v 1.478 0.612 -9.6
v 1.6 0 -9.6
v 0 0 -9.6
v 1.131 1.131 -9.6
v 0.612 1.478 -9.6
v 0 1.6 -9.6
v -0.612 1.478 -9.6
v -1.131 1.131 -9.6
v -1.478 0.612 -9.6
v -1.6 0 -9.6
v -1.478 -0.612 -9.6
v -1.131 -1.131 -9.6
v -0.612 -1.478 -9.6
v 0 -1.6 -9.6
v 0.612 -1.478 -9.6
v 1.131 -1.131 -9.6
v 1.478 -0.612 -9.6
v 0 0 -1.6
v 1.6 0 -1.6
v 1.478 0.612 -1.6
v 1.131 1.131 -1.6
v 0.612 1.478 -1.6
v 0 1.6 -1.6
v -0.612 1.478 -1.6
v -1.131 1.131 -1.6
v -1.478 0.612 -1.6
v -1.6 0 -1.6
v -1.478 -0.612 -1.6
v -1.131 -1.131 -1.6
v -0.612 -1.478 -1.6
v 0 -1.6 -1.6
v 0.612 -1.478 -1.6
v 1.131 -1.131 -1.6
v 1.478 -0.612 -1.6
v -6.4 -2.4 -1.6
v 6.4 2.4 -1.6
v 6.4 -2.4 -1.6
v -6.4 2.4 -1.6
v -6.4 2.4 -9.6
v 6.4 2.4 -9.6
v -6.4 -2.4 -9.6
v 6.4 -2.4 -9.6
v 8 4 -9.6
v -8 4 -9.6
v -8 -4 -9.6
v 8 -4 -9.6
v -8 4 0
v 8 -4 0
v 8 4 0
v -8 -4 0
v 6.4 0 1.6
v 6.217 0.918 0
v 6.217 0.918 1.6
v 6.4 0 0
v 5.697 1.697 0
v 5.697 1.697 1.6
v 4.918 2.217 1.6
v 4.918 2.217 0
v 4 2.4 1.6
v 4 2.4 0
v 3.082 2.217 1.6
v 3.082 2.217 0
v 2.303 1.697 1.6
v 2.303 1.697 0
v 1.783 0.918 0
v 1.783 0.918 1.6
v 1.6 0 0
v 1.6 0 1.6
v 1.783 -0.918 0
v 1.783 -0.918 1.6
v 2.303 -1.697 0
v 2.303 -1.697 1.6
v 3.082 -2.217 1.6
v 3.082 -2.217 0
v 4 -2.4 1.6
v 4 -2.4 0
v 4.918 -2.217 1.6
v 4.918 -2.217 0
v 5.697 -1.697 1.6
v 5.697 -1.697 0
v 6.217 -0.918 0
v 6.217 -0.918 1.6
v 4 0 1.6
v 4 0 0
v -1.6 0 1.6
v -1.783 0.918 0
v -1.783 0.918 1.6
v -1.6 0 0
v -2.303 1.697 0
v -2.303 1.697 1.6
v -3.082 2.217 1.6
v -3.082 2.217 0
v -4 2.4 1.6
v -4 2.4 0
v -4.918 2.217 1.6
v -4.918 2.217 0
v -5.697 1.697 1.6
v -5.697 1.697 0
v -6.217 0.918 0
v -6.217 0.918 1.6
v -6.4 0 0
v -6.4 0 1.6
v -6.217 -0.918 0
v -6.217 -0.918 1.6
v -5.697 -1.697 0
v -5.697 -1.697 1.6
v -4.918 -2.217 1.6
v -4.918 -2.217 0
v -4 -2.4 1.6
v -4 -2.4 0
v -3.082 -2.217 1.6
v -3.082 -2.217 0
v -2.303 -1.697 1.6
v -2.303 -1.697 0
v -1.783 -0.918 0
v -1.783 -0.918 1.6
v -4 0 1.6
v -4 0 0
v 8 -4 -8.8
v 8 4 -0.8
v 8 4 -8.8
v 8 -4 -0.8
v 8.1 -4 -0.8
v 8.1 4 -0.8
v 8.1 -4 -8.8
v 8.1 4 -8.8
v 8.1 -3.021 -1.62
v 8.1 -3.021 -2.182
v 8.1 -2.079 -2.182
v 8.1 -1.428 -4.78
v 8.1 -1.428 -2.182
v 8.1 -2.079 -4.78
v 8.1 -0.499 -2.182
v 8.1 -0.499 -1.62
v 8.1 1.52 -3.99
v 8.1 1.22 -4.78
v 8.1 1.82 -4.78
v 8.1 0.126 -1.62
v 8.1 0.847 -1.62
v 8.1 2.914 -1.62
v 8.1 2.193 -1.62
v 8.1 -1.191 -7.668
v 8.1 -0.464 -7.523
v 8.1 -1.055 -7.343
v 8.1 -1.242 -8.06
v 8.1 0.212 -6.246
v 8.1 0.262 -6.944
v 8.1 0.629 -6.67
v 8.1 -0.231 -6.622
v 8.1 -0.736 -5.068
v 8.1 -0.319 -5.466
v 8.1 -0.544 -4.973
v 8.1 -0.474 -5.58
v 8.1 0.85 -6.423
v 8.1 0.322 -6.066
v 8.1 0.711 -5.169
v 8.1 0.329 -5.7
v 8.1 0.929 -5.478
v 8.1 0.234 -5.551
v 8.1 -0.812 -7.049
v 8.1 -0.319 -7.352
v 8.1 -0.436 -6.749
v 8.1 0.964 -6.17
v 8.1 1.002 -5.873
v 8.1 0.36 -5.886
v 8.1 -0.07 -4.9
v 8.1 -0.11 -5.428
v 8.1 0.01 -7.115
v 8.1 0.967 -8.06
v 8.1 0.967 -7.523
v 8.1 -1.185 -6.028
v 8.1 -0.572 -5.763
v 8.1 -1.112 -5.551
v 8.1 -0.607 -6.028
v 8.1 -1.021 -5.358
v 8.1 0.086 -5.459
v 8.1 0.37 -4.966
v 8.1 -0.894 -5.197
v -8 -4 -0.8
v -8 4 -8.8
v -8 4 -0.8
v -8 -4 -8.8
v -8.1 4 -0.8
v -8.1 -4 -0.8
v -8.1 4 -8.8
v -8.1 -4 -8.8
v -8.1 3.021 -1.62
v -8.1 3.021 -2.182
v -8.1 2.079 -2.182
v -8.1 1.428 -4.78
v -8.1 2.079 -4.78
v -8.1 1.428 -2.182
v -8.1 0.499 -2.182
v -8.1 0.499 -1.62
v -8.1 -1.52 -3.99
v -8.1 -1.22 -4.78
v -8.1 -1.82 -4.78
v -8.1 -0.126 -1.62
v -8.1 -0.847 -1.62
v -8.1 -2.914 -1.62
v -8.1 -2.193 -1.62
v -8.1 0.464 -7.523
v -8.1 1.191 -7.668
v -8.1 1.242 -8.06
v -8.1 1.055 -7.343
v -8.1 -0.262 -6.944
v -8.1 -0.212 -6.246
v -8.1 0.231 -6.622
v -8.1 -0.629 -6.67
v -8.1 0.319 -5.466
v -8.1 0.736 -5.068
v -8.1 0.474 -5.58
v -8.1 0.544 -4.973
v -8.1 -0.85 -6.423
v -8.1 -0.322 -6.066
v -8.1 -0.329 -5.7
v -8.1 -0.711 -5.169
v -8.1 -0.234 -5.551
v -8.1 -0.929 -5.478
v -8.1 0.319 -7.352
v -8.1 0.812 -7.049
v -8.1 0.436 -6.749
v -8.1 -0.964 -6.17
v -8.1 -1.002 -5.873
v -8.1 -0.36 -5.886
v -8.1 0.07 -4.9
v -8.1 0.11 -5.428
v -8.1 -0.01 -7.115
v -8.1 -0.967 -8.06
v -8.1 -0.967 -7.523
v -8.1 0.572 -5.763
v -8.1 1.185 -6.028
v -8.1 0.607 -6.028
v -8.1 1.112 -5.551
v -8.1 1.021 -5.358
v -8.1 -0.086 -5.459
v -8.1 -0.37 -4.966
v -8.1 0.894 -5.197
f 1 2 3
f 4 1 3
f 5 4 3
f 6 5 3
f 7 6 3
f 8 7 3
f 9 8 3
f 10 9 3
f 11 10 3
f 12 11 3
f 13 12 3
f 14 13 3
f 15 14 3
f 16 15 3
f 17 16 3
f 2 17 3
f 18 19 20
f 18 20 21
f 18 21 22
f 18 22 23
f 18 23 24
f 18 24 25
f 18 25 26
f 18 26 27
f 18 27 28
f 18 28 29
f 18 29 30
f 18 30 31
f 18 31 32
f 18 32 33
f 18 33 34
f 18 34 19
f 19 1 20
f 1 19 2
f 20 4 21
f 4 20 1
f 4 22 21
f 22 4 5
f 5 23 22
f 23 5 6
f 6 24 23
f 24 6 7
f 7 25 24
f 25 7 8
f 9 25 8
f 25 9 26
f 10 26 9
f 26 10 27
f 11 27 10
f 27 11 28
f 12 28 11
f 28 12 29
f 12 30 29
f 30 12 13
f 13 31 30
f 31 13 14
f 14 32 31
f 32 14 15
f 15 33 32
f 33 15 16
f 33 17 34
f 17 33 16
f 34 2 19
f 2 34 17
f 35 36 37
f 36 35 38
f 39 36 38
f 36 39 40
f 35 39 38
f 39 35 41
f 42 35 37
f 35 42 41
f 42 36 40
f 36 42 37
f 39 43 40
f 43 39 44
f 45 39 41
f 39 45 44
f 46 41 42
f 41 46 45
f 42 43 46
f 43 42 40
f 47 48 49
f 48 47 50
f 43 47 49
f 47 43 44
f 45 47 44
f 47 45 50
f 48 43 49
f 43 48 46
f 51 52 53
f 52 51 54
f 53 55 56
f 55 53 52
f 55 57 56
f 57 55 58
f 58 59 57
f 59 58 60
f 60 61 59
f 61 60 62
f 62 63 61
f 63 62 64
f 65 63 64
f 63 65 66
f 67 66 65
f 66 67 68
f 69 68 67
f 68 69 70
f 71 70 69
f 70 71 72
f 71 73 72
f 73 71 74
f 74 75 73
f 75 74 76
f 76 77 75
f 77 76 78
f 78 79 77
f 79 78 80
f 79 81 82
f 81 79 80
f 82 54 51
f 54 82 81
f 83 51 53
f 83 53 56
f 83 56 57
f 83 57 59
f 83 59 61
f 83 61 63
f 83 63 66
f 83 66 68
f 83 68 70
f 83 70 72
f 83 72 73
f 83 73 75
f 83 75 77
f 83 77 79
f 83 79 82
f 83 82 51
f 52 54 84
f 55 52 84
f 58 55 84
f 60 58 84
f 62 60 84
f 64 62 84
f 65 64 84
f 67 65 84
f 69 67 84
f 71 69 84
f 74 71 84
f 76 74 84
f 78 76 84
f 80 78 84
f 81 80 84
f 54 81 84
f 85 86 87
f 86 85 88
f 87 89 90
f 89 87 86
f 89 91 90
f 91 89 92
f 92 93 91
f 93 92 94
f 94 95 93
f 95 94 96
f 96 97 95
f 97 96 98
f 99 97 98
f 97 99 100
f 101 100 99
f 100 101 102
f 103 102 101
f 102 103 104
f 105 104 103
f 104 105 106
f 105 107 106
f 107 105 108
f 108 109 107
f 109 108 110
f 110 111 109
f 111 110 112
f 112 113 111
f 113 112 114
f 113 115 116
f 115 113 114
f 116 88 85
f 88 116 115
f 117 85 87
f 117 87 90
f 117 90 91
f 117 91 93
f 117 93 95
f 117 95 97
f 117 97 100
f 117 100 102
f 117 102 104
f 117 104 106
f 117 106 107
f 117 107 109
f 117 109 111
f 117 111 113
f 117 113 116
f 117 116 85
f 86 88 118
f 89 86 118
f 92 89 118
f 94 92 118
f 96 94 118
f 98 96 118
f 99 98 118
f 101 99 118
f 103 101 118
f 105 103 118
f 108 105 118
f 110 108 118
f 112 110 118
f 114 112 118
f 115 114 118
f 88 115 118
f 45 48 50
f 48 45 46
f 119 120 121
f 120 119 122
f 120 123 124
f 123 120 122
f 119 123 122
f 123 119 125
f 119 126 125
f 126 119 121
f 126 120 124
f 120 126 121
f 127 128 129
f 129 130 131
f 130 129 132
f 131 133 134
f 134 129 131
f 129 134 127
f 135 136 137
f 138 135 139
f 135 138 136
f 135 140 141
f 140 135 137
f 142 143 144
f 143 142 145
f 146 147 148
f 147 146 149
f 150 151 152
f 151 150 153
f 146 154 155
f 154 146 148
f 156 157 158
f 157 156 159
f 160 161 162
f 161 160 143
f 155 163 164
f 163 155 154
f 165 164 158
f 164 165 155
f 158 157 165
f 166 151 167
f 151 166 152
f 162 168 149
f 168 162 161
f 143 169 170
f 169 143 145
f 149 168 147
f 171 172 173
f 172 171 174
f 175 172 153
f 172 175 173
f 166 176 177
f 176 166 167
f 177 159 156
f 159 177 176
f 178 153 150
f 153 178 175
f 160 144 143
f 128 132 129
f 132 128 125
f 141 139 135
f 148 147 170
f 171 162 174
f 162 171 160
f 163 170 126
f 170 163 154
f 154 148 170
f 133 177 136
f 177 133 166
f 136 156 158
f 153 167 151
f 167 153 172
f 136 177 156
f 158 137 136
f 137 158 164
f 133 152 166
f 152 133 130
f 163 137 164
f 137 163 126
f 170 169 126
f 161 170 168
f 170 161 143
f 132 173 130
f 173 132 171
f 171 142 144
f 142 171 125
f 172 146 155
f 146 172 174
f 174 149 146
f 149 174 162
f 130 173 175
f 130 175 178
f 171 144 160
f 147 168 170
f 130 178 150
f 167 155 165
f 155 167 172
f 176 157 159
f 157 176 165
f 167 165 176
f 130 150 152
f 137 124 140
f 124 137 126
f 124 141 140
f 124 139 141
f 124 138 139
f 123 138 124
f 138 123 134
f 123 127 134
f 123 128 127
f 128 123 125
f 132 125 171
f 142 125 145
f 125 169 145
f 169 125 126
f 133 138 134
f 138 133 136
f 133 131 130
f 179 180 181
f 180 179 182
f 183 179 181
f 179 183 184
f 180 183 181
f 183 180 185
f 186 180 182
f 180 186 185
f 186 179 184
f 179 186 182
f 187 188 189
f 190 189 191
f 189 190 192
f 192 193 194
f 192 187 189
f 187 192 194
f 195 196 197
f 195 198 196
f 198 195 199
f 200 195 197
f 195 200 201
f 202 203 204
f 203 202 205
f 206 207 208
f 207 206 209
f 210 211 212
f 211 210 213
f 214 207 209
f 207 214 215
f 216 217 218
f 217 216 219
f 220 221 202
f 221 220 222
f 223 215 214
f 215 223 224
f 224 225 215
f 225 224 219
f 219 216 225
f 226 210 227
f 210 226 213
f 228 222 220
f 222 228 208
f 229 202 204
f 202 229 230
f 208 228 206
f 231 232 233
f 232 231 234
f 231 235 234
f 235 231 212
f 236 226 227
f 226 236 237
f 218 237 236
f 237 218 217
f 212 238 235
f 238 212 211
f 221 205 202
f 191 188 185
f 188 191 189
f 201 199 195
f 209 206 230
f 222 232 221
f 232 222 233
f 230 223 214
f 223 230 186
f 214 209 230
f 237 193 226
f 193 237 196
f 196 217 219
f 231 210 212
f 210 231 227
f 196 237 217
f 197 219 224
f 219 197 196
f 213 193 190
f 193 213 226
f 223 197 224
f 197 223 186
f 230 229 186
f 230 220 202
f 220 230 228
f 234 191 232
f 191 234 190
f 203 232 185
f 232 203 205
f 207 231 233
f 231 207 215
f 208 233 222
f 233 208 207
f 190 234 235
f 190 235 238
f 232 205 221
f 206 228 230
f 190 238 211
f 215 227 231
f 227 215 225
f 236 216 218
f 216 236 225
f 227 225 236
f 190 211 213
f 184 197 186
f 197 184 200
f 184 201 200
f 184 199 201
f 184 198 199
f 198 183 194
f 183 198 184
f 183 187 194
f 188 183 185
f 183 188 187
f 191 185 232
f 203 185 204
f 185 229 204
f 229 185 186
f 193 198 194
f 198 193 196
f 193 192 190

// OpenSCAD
// file: ../p/4-4edge.scad
use <../lib.scad>
function ldraw_lib__4_4edge() = [
// 0 Circle 1.0
// 0 Name: 4-4edge.dat
// 0 Author: James Jessiman
// 0 !LDRAW_ORG Primitive UPDATE 2017-01
// 0 !LICENSE Licensed under CC BY 2.0 and CC BY 4.0 : see CAreadme.txt
// 
// 0 BFC CERTIFY CCW
  [0,"BFC","CERTIFY"],
  [0,"BFC","CCW"],
// 
// 0 !HISTORY 1998-12-15 [PTadmin] Official Update 1998-10
// 0 !HISTORY 2005-12-28 [PTadmin] Official Update 2005-01
// 0 !HISTORY 2007-06-24 [PTadmin] Header formatted for Contributor Agreement
// 0 !HISTORY 2008-07-01 [PTadmin] Official Update 2008-01
// 0 !HISTORY 2017-01-15 [Steffen] BFCed
// 0 !HISTORY 2017-12-30 [PTadmin] Official Update 2017-01
// 
// 
// 2 24 1 0 0 0.9239 0 0.3827
  [2,24,1,0,0,0.9239,0,0.3827],
// 2 24 0.9239 0 0.3827 0.7071 0 0.7071
  [2,24,0.9239,0,0.3827,0.7071,0,0.7071],
// 2 24 0.7071 0 0.7071 0.3827 0 0.9239
  [2,24,0.7071,0,0.7071,0.3827,0,0.9239],
// 2 24 0.3827 0 0.9239 0 0 1
  [2,24,0.3827,0,0.9239,0,0,1],
// 2 24 0 0 1 -0.3827 0 0.9239
  [2,24,0,0,1,-0.3827,0,0.9239],
// 2 24 -0.3827 0 0.9239 -0.7071 0 0.7071
  [2,24,-0.3827,0,0.9239,-0.7071,0,0.7071],
// 2 24 -0.7071 0 0.7071 -0.9239 0 0.3827
  [2,24,-0.7071,0,0.7071,-0.9239,0,0.3827],
// 2 24 -0.9239 0 0.3827 -1 0 -0
  [2,24,-0.9239,0,0.3827,-1,0,-0],
// 2 24 -1 0 -0 -0.9239 0 -0.3827
  [2,24,-1,0,-0,-0.9239,0,-0.3827],
// 2 24 -0.9239 0 -0.3827 -0.7071 0 -0.7071
  [2,24,-0.9239,0,-0.3827,-0.7071,0,-0.7071],
// 2 24 -0.7071 0 -0.7071 -0.3827 0 -0.9239
  [2,24,-0.7071,0,-0.7071,-0.3827,0,-0.9239],
// 2 24 -0.3827 0 -0.9239 0 0 -1
  [2,24,-0.3827,0,-0.9239,0,0,-1],
// 2 24 0 0 -1 0.3827 0 -0.9239
  [2,24,0,0,-1,0.3827,0,-0.9239],
// 2 24 0.3827 0 -0.9239 0.7071 0 -0.7071
  [2,24,0.3827,0,-0.9239,0.7071,0,-0.7071],
// 2 24 0.7071 0 -0.7071 0.9239 0 -0.3827
  [2,24,0.7071,0,-0.7071,0.9239,0,-0.3827],
// 2 24 0.9239 0 -0.3827 1 0 0
  [2,24,0.9239,0,-0.3827,1,0,0],
];
module ldraw_lib__4_4edge(step=0, col=false, unit=2/5, alt=false, line=0.2, solid=!$preview)
    makepoly(ldraw_lib__4_4edge(), step=step, col=col, unit=unit, alt=alt, line=line, solid=solid);
ldraw_lib__4_4edge(line=0.2);
// file: ../p/4-4disc.scad
use <../lib.scad>
function ldraw_lib__4_4disc() = [
// 0 Disc 1.0
// 0 Name: 4-4disc.dat
// 0 Author: James Jessiman
// 0 !LDRAW_ORG Primitive UPDATE 2002-02
// 0 !LICENSE Licensed under CC BY 2.0 and CC BY 4.0 : see CAreadme.txt
// 
// 0 BFC CERTIFY CCW
  [0,"BFC","CERTIFY"],
  [0,"BFC","CCW"],
// 
// 0 !HISTORY 1998-12-15 [PTadmin] Official Update 1998-10
// 0 !HISTORY 2002-03-23 [sbliss] Added BFC statement
// 0 !HISTORY 2002-04-25 [PTadmin] Official Update 2002-02
// 0 !HISTORY 2007-06-24 [PTadmin] Header formatted for Contributor Agreement
// 0 !HISTORY 2008-07-01 [PTadmin] Official Update 2008-01
// 
// 
// 3 16 0 0 0 1 0 0 0.9239 0 0.3827
  [3,16,0,0,0,1,0,0,0.9239,0,0.3827],
// 3 16 0 0 0 0.9239 0 0.3827 0.7071 0 0.7071
  [3,16,0,0,0,0.9239,0,0.3827,0.7071,0,0.7071],
// 3 16 0 0 0 0.7071 0 0.7071 0.3827 0 0.9239
  [3,16,0,0,0,0.7071,0,0.7071,0.3827,0,0.9239],
// 3 16 0 0 0 0.3827 0 0.9239 0 0 1
  [3,16,0,0,0,0.3827,0,0.9239,0,0,1],
// 3 16 0 0 0 0 0 1 -0.3827 0 0.9239
  [3,16,0,0,0,0,0,1,-0.3827,0,0.9239],
// 3 16 0 0 0 -0.3827 0 0.9239 -0.7071 0 0.7071
  [3,16,0,0,0,-0.3827,0,0.9239,-0.7071,0,0.7071],
// 3 16 0 0 0 -0.7071 0 0.7071 -0.9239 0 0.3827
  [3,16,0,0,0,-0.7071,0,0.7071,-0.9239,0,0.3827],
// 3 16 0 0 0 -0.9239 0 0.3827 -1 0 -0
  [3,16,0,0,0,-0.9239,0,0.3827,-1,0,-0],
// 3 16 0 0 0 -1 0 -0 -0.9239 0 -0.3827
  [3,16,0,0,0,-1,0,-0,-0.9239,0,-0.3827],
// 3 16 0 0 0 -0.9239 0 -0.3827 -0.7071 0 -0.7071
  [3,16,0,0,0,-0.9239,0,-0.3827,-0.7071,0,-0.7071],
// 3 16 0 0 0 -0.7071 0 -0.7071 -0.3827 0 -0.9239
  [3,16,0,0,0,-0.7071,0,-0.7071,-0.3827,0,-0.9239],
// 3 16 0 0 0 -0.3827 0 -0.9239 0 0 -1
  [3,16,0,0,0,-0.3827,0,-0.9239,0,0,-1],
// 3 16 0 0 0 0 0 -1 0.3827 0 -0.9239
  [3,16,0,0,0,0,0,-1,0.3827,0,-0.9239],
// 3 16 0 0 0 0.3827 0 -0.9239 0.7071 0 -0.7071
  [3,16,0,0,0,0.3827,0,-0.9239,0.7071,0,-0.7071],
// 3 16 0 0 0 0.7071 0 -0.7071 0.9239 0 -0.3827
  [3,16,0,0,0,0.7071,0,-0.7071,0.9239,0,-0.3827],
// 3 16 0 0 0 0.9239 0 -0.3827 1 0 0
  [3,16,0,0,0,0.9239,0,-0.3827,1,0,0],
// 0
];
module ldraw_lib__4_4disc(step=0, col=false, unit=2/5, alt=false, line=0.2, solid=!$preview)
    makepoly(ldraw_lib__4_4disc(), step=step, col=col, unit=unit, alt=alt, line=line, solid=solid);
ldraw_lib__4_4disc(line=0.2);
// file: ../p/4-4cyli.scad
use <../lib.scad>
$fa=1; $fs=0.2;
function ldraw_lib__4_4cyli(realsolid=false) = [
// 0 Cylinder 1.0
// 0 Name: 4-4cyli.dat
// 0 Author: James Jessiman
// 0 !LDRAW_ORG Primitive UPDATE 2005-01
// 0 !LICENSE Licensed under CC BY 2.0 and CC BY 4.0 : see CAreadme.txt
// 
// 0 BFC CERTIFY CCW
  [0,"BFC","CERTIFY"],
  [0,"BFC","CCW"],
// 
// 0 !HISTORY 1998-12-15 [PTadmin] Official Update 1998-10
// 0 !HISTORY 2002-03-23 [sbliss] Added BFC statement; merged headers from files in distributions LDraw 0.27 and Complete.
// 0 !HISTORY 2002-04-25 [PTadmin] Official Update 2002-02
// 0 !HISTORY 2004-12-14 [guyvivan] BFC CCW
// 0 !HISTORY 2005-12-28 [PTadmin] Official Update 2005-01
// 0 !HISTORY 2007-06-24 [PTadmin] Header formatted for Contributor Agreement
// 0 !HISTORY 2008-07-01 [PTadmin] Official Update 2008-01
// 
// 
// 4 16 1 1 0 0.9239 1 0.3827 0.9239 0 0.3827 1 0 0
  [4,16,1,1,0,0.9239,1,0.3827,0.9239,0,0.3827,1,0,0],
// 5 24 1 0 0 1 1 0 0.9239 0 0.3827 0.9239 0 -0.3827
  [5,24,1,0,0,1,1,0,0.9239,0,0.3827,0.9239,0,-0.3827],
// 4 16 0.9239 1 0.3827 0.7071 1 0.7071 0.7071 0 0.7071 0.9239 0 0.3827
  [4,16,0.9239,1,0.3827,0.7071,1,0.7071,0.7071,0,0.7071,0.9239,0,0.3827],
// 5 24 0.9239 0 0.3827 0.9239 1 0.3827 0.7071 0 0.7071 1 0 0
  [5,24,0.9239,0,0.3827,0.9239,1,0.3827,0.7071,0,0.7071,1,0,0],
// 4 16 0.7071 1 0.7071 0.3827 1 0.9239 0.3827 0 0.9239 0.7071 0 0.7071
  [4,16,0.7071,1,0.7071,0.3827,1,0.9239,0.3827,0,0.9239,0.7071,0,0.7071],
// 5 24 0.7071 0 0.7071 0.7071 1 0.7071 0.3827 0 0.9239 0.9239 0 0.3827
  [5,24,0.7071,0,0.7071,0.7071,1,0.7071,0.3827,0,0.9239,0.9239,0,0.3827],
// 4 16 0.3827 1 0.9239 0 1 1 0 0 1 0.3827 0 0.9239
  [4,16,0.3827,1,0.9239,0,1,1,0,0,1,0.3827,0,0.9239],
// 5 24 0.3827 0 0.9239 0.3827 1 0.9239 0 0 1 0.7071 0 0.7071
  [5,24,0.3827,0,0.9239,0.3827,1,0.9239,0,0,1,0.7071,0,0.7071],
// 4 16 0 1 1 -0.3827 1 0.9239 -0.3827 0 0.9239 0 0 1
  [4,16,0,1,1,-0.3827,1,0.9239,-0.3827,0,0.9239,0,0,1],
// 5 24 0 0 1 0 1 1 -0.3827 0 0.9239 0.3827 0 0.9239
  [5,24,0,0,1,0,1,1,-0.3827,0,0.9239,0.3827,0,0.9239],
// 4 16 -0.3827 1 0.9239 -0.7071 1 0.7071 -0.7071 0 0.7071 -0.3827 0 0.9239
  [4,16,-0.3827,1,0.9239,-0.7071,1,0.7071,-0.7071,0,0.7071,-0.3827,0,0.9239],
// 5 24 -0.3827 0 0.9239 -0.3827 1 0.9239 -0.7071 0 0.7071 0 0 1
  [5,24,-0.3827,0,0.9239,-0.3827,1,0.9239,-0.7071,0,0.7071,0,0,1],
// 4 16 -0.7071 1 0.7071 -0.9239 1 0.3827 -0.9239 0 0.3827 -0.7071 0 0.7071
  [4,16,-0.7071,1,0.7071,-0.9239,1,0.3827,-0.9239,0,0.3827,-0.7071,0,0.7071],
// 5 24 -0.7071 0 0.7071 -0.7071 1 0.7071 -0.9239 0 0.3827 -0.3827 0 0.9239
  [5,24,-0.7071,0,0.7071,-0.7071,1,0.7071,-0.9239,0,0.3827,-0.3827,0,0.9239],
// 4 16 -0.9239 1 0.3827 -1 1 0 -1 0 0 -0.9239 0 0.3827
  [4,16,-0.9239,1,0.3827,-1,1,0,-1,0,0,-0.9239,0,0.3827],
// 5 24 -0.9239 0 0.3827 -0.9239 1 0.3827 -1 0 0 -0.7071 0 0.7071
  [5,24,-0.9239,0,0.3827,-0.9239,1,0.3827,-1,0,0,-0.7071,0,0.7071],
// 4 16 -1 1 0 -0.9239 1 -0.3827 -0.9239 0 -0.3827 -1 0 0
  [4,16,-1,1,0,-0.9239,1,-0.3827,-0.9239,0,-0.3827,-1,0,0],
// 5 24 -1 0 0 -1 1 0 -0.9239 0 -0.3827 -0.9239 0 0.3827
  [5,24,-1,0,0,-1,1,0,-0.9239,0,-0.3827,-0.9239,0,0.3827],
// 4 16 -0.9239 1 -0.3827 -0.7071 1 -0.7071 -0.7071 0 -0.7071 -0.9239 0 -0.3827
  [4,16,-0.9239,1,-0.3827,-0.7071,1,-0.7071,-0.7071,0,-0.7071,-0.9239,0,-0.3827],
// 5 24 -0.9239 0 -0.3827 -0.9239 1 -0.3827 -0.7071 0 -0.7071 -1 0 0
  [5,24,-0.9239,0,-0.3827,-0.9239,1,-0.3827,-0.7071,0,-0.7071,-1,0,0],
// 4 16 -0.7071 1 -0.7071 -0.3827 1 -0.9239 -0.3827 0 -0.9239 -0.7071 0 -0.7071
  [4,16,-0.7071,1,-0.7071,-0.3827,1,-0.9239,-0.3827,0,-0.9239,-0.7071,0,-0.7071],
// 5 24 -0.7071 0 -0.7071 -0.7071 1 -0.7071 -0.3827 0 -0.9239 -0.9239 0 -0.3827
  [5,24,-0.7071,0,-0.7071,-0.7071,1,-0.7071,-0.3827,0,-0.9239,-0.9239,0,-0.3827],
// 4 16 -0.3827 1 -0.9239 0 1 -1 0 0 -1 -0.3827 0 -0.9239
  [4,16,-0.3827,1,-0.9239,0,1,-1,0,0,-1,-0.3827,0,-0.9239],
// 5 24 -0.3827 0 -0.9239 -0.3827 1 -0.9239 0 0 -1 -0.7071 0 -0.7071
  [5,24,-0.3827,0,-0.9239,-0.3827,1,-0.9239,0,0,-1,-0.7071,0,-0.7071],
// 4 16 0 1 -1 0.3827 1 -0.9239 0.3827 0 -0.9239 0 0 -1
  [4,16,0,1,-1,0.3827,1,-0.9239,0.3827,0,-0.9239,0,0,-1],
// 5 24 0 0 -1 0 1 -1 0.3827 0 -0.9239 -0.3827 0 -0.9239
  [5,24,0,0,-1,0,1,-1,0.3827,0,-0.9239,-0.3827,0,-0.9239],
// 4 16 0.3827 1 -0.9239 0.7071 1 -0.7071 0.7071 0 -0.7071 0.3827 0 -0.9239
  [4,16,0.3827,1,-0.9239,0.7071,1,-0.7071,0.7071,0,-0.7071,0.3827,0,-0.9239],
// 5 24 0.3827 0 -0.9239 0.3827 1 -0.9239 0.7071 0 -0.7071 0 0 -1
  [5,24,0.3827,0,-0.9239,0.3827,1,-0.9239,0.7071,0,-0.7071,0,0,-1],
// 4 16 0.7071 1 -0.7071 0.9239 1 -0.3827 0.9239 0 -0.3827 0.7071 0 -0.7071
  [4,16,0.7071,1,-0.7071,0.9239,1,-0.3827,0.9239,0,-0.3827,0.7071,0,-0.7071],
// 5 24 0.7071 0 -0.7071 0.7071 1 -0.7071 0.9239 0 -0.3827 0.3827 0 -0.9239
  [5,24,0.7071,0,-0.7071,0.7071,1,-0.7071,0.9239,0,-0.3827,0.3827,0,-0.9239],
// 4 16 0.9239 1 -0.3827 1 1 0 1 0 0 0.9239 0 -0.3827
  [4,16,0.9239,1,-0.3827,1,1,0,1,0,0,0.9239,0,-0.3827],
// 5 24 0.9239 0 -0.3827 0.9239 1 -0.3827 1 0 0 0.7071 0 -0.7071
  [5,24,0.9239,0,-0.3827,0.9239,1,-0.3827,1,0,0,0.7071,0,-0.7071],
// 0
];
module ldraw_lib__4_4cyli(step=0, col=false, unit=2/5, alt=false, line=0.2, solid=!$preview)
    makepoly(ldraw_lib__4_4cyli(solid), step=step, col=col, unit=unit, alt=alt, line=line, solid=solid);
ldraw_lib__4_4cyli(line=0.2);
// file: ../p/stud3.scad
use <../lib.scad>
use <4-4cyli.scad>
use <4-4disc.scad>
use <4-4edge.scad>
function ldraw_lib__stud3() = [
// 0 Stud Tube Solid
// 0 Name: stud3.dat
// 0 Author: James Jessiman
// 0 !LDRAW_ORG Primitive UPDATE 2012-01
// 0 !LICENSE Licensed under CC BY 4.0 : see CAreadme.txt
// 
// 0 BFC CERTIFY CCW
  [0,"BFC","CERTIFY"],
  [0,"BFC","CCW"],
// 
// 0 !HISTORY 2002-04-04 [sbliss] Modified for BFC compliance
// 0 !HISTORY 2002-04-25 [PTadmin] Official Update 2002-02
// 0 !HISTORY 2007-06-24 [PTadmin] Header formatted for Contributor Agreement
// 0 !HISTORY 2008-07-01 [PTadmin] Official Update 2008-01
// 0 !HISTORY 2012-02-16 [Philo] Changed to CCW
// 0 !HISTORY 2012-03-30 [PTadmin] Official Update 2012-01
// 
// 
// 1 16 0 -4 0 4 0 0 0 1 0 0 0 4 4-4edge.dat
  [1,16,0,-4,0,4,0,0,0,1,0,0,0,4, ldraw_lib__4_4edge()],
// 1 16 0 0 0 4 0 0 0 1 0 0 0 4 4-4edge.dat
  [1,16,0,0,0,4,0,0,0,1,0,0,0,4, ldraw_lib__4_4edge()],
// 1 16 0 -4 0 4 0 0 0 1 0 0 0 4 4-4disc.dat
  [1,16,0,-4,0,4,0,0,0,1,0,0,0,4, ldraw_lib__4_4disc()],
  [-1,16,0,0,0,4,0,0,0,-1,0,0,0,4, ldraw_lib__4_4disc()],
// 1 16 0 -4 0 4 0 0 0 4 0 0 0 4 4-4cyli.dat
  [1,16,0,-4,0,4,0,0,0,4,0,0,0,4, ldraw_lib__4_4cyli()],
];
module ldraw_lib__stud3(step=0, col=false, unit=2/5, alt=false, line=0.2, solid=!$preview)
    makepoly(ldraw_lib__stud3(), step=step, col=col, unit=unit, alt=alt, line=line, solid=solid);
ldraw_lib__stud3(line=0.2);
// file: ../p/stud.scad
use <../lib.scad>
use <4-4cyli.scad>
use <4-4disc.scad>
use <4-4edge.scad>
function ldraw_lib__stud() = [
// 0 Stud
// 0 Name: stud.dat
// 0 Author: James Jessiman
// 0 !LDRAW_ORG Primitive UPDATE 2012-01
// 0 !LICENSE Licensed under CC BY 4.0 : see CAreadme.txt
// 
// 0 BFC CERTIFY CCW
  [0,"BFC","CERTIFY"],
  [0,"BFC","CCW"],
// 
// 0 !HISTORY 2002-04-04 [sbliss] Modified for BFC compliance
// 0 !HISTORY 2002-04-25 [PTadmin] Official Update 2002-02
// 0 !HISTORY 2007-06-24 [PTadmin] Header formatted for Contributor Agreement
// 0 !HISTORY 2008-07-01 [PTadmin] Official Update 2008-01
// 0 !HISTORY 2012-02-16 [Philo] Changed to CCW
// 0 !HISTORY 2012-03-30 [PTadmin] Official Update 2012-01
// 
// 
// 1 16 0 0 0 6 0 0 0 1 0 0 0 6 4-4edge.dat
  [1,16,0,0,0,6,0,0,0,1,0,0,0,6, ldraw_lib__4_4edge()],
// 1 16 0 -4 0 6 0 0 0 1 0 0 0 6 4-4edge.dat
  [1,16,0,-4,0,6,0,0,0,1,0,0,0,6, ldraw_lib__4_4edge()],
// 1 16 0 0 0 6 0 0 0 -4 0 0 0 6 4-4cyli.dat
  [1,16,0,0,0,6,0,0,0,-4,0,0,0,6, ldraw_lib__4_4cyli()],
// 1 16 0 -4 0 6 0 0 0 1 0 0 0 6 4-4disc.dat
  [1,16,0,-4,0,6,0,0,0,1,0,0,0,6, ldraw_lib__4_4disc()],
  [-1,16,0,0,0,6,0,0,0,-1,0,0,0,6, ldraw_lib__4_4disc()],
];
module ldraw_lib__stud(step=0, col=false, unit=2/5, alt=false, line=0.2, solid=!$preview)
    makepoly(ldraw_lib__stud(), step=step, col=col, unit=unit, alt=alt, line=line, solid=solid);
ldraw_lib__stud(line=0.2);
// file: ../p/box5.scad
use <../lib.scad>
function ldraw_lib__box5() = [
// 0 Box with 5 Faces and All Edges
// 0 Name: box5.dat
// 0 Author: James Jessiman
// 0 !LDRAW_ORG Primitive UPDATE 2012-01
// 0 !LICENSE Licensed under CC BY 2.0 and CC BY 4.0 : see CAreadme.txt
// 
// 0 BFC CERTIFY CCW
  [0,"BFC","CERTIFY"],
  [0,"BFC","CCW"],
// 
// 0 !HISTORY 2002-04-03 [sbliss] Modified for BFC compliance
// 0 !HISTORY 2002-04-25 [PTadmin] Official Update 2002-02
// 0 !HISTORY 2007-06-24 [PTadmin] Header formatted for Contributor Agreement
// 0 !HISTORY 2008-07-01 [PTadmin] Official Update 2008-01
// 0 !HISTORY 2012-02-16 [Philo] Changed to CCW
// 0 !HISTORY 2012-03-30 [PTadmin] Official Update 2012-01
// 
// 
// 2 24 1 1 1 -1 1 1
  [2,24,1,1,1,-1,1,1],
// 2 24 -1 1 1 -1 1 -1
  [2,24,-1,1,1,-1,1,-1],
// 2 24 -1 1 -1 1 1 -1
  [2,24,-1,1,-1,1,1,-1],
// 2 24 1 1 -1 1 1 1
  [2,24,1,1,-1,1,1,1],
// 2 24 1 0 1 -1 0 1
  [2,24,1,0,1,-1,0,1],
// 2 24 -1 0 1 -1 0 -1
  [2,24,-1,0,1,-1,0,-1],
// 2 24 -1 0 -1 1 0 -1
  [2,24,-1,0,-1,1,0,-1],
// 2 24 1 0 -1 1 0 1
  [2,24,1,0,-1,1,0,1],
// 2 24 1 0 1 1 1 1
  [2,24,1,0,1,1,1,1],
// 2 24 -1 0 1 -1 1 1
  [2,24,-1,0,1,-1,1,1],
// 2 24 1 0 -1 1 1 -1
  [2,24,1,0,-1,1,1,-1],
// 2 24 -1 0 -1 -1 1 -1
  [2,24,-1,0,-1,-1,1,-1],
// 4 16 -1 1 1 1 1 1 1 1 -1 -1 1 -1
  [4,16,-1,1,1,1,1,1,1,1,-1,-1,1,-1],
// 4 16 -1 1 1 -1 0 1 1 0 1 1 1 1
  [4,16,-1,1,1,-1,0,1,1,0,1,1,1,1],
// 4 16 -1 1 -1 -1 0 -1 -1 0 1 -1 1 1
  [4,16,-1,1,-1,-1,0,-1,-1,0,1,-1,1,1],
// 4 16 1 1 -1 1 0 -1 -1 0 -1 -1 1 -1
  [4,16,1,1,-1,1,0,-1,-1,0,-1,-1,1,-1],
// 4 16 1 1 1 1 0 1 1 0 -1 1 1 -1
  [4,16,1,1,1,1,0,1,1,0,-1,1,1,-1],
];
makepoly(ldraw_lib__box5(), line=0.2);
// file: ../p/box4t.scad
use <../lib.scad>
function ldraw_lib__box4t() = [
// 0 Box with 4 Adjacent Faces and All Edges
// 0 Name: box4t.dat
// 0 Author: Tore Eriksson [Tore_Eriksson]
// 0 !LDRAW_ORG Primitive UPDATE 2003-02
// 0 !LICENSE Licensed under CC BY 4.0 : see CAreadme.txt
// 
// 0 BFC CERTIFY CCW
  [0,"BFC","CERTIFY"],
  [0,"BFC","CCW"],
// 
// 0 !HISTORY 1997-09-29 [PTadmin] Official Update 1997-15
// 0 !HISTORY 2002-08-31 [izanette] Modified with WINDZ for BFC compliance
// 0 !HISTORY 2003-08-01 [PTadmin] Official Update 2003-02
// 0 !HISTORY 2007-06-24 [PTadmin] Header formatted for Contributor Agreement
// 0 !HISTORY 2008-07-01 [PTadmin] Official Update 2008-01
// 
// 
// 2 24 1 1 1 -1 1 1
  [2,24,1,1,1,-1,1,1],
// 2 24 -1 1 1 -1 1 -1
  [2,24,-1,1,1,-1,1,-1],
// 2 24 -1 1 -1 1 1 -1
  [2,24,-1,1,-1,1,1,-1],
// 2 24 1 1 -1 1 1 1
  [2,24,1,1,-1,1,1,1],
// 2 24 1 0 1 -1 0 1
  [2,24,1,0,1,-1,0,1],
// 2 24 -1 0 1 -1 0 -1
  [2,24,-1,0,1,-1,0,-1],
// 2 24 -1 0 -1 1 0 -1
  [2,24,-1,0,-1,1,0,-1],
// 2 24 1 0 -1 1 0 1
  [2,24,1,0,-1,1,0,1],
// 2 24 1 0 1 1 1 1
  [2,24,1,0,1,1,1,1],
// 2 24 -1 0 1 -1 1 1
  [2,24,-1,0,1,-1,1,1],
// 2 24 1 0 -1 1 1 -1
  [2,24,1,0,-1,1,1,-1],
// 2 24 -1 0 -1 -1 1 -1
  [2,24,-1,0,-1,-1,1,-1],
// 4 16 1 1 1 1 1 -1 -1 1 -1 -1 1 1
  [4,16,1,1,1,1,1,-1,-1,1,-1,-1,1,1],
// 4 16 1 1 1 -1 1 1 -1 0 1 1 0 1
  [4,16,1,1,1,-1,1,1,-1,0,1,1,0,1],
// 4 16 -1 1 1 -1 1 -1 -1 0 -1 -1 0 1
  [4,16,-1,1,1,-1,1,-1,-1,0,-1,-1,0,1],
// 0 // 4 16 -1 1 -1 -1 0 -1 1 0 -1 1 1 -1
// 4 16 1 1 -1 1 1 1 1 0 1 1 0 -1
  [4,16,1,1,-1,1,1,1,1,0,1,1,0,-1],
// 0
];
module ldraw_lib__box4t(step=0, col=false, unit=2/5, alt=false, line=0.2, solid=!$preview)
    makepoly(ldraw_lib__box4t(), step=step, col=col, unit=unit, alt=alt, line=line, solid=solid);
ldraw_lib__box4t(line=0.2);
// file: s/3004s01.scad
use <../../lib.scad>
use <../../p/box4t.scad>
use <../../p/box5.scad>
use <../../p/stud.scad>
use <../../p/stud3.scad>
$fa=1; $fs=0.2;
function ldraw_lib__s__3004s01(realsolid=false) = [
// 0 ~Brick  1 x  2 without Front Face
// 0 Name: s\3004s01.dat
// 0 Author: James Jessiman
// 0 !LDRAW_ORG Subpart UPDATE 2003-03
// 0 !LICENSE Licensed under CC BY 2.0 and CC BY 4.0 : see CAreadme.txt
// 
// 0 BFC CERTIFY CCW
  [0,"BFC","CERTIFY"],
  [0,"BFC","CCW"],
// 
// 0 !HISTORY 2003-09-07 [jriley] Subfiling, BFC
// 0 !HISTORY 2003-12-19 [PTadmin] Official Update 2003-03
// 0 !HISTORY 2007-08-29 [PTadmin] Header formatted for Contributor Agreement
// 0 !HISTORY 2008-07-01 [PTadmin] Official Update 2008-01
// 
// 
// 1 16 0 4 0 1 0 0 0 -5 0 0 0 1 stud3.dat
  [1,16,0,4,0,1,0,0,0,-5,0,0,0,1, ldraw_lib__stud3(realsolid)],
// 0 BFC INVERTNEXT
  [0,"BFC","INVERTNEXT"],
// 1 16 0 24 0 16 0 0 0 -20 0 0 0 6 box5.dat
  [1,16,0,24,0,16,0,0,0,-20,0,0,0,6, ldraw_lib__box5(realsolid)],
// 4 16 20 24 10 16 24 6 -16 24 6 -20 24 10
  [4,16,20,24,10,16,24,6,-16,24,6,-20,24,10],
// 4 16 -20 24 10 -16 24 6 -16 24 -6 -20 24 -10
  [4,16,-20,24,10,-16,24,6,-16,24,-6,-20,24,-10],
// 4 16 -20 24 -10 -16 24 -6 16 24 -6 20 24 -10
  [4,16,-20,24,-10,-16,24,-6,16,24,-6,20,24,-10],
// 4 16 20 24 -10 16 24 -6 16 24 6 20 24 10
  [4,16,20,24,-10,16,24,-6,16,24,6,20,24,10],
// 1 16 0 24 0 20 0 0 0 -24 0 0 0 10 box4t.dat
  [1,16,0,24,0,20,0,0,0,-24,0,0,0,10, ldraw_lib__box4t(realsolid)],
// 1 16 10 0 0 1 0 0 0 1 0 0 0 1 stud.dat
  [1,16,10,0,0,1,0,0,0,1,0,0,0,1, ldraw_lib__stud(realsolid)],
// 1 16 -10 0 0 1 0 0 0 1 0 0 0 1 stud.dat
  [1,16,-10,0,0,1,0,0,0,1,0,0,0,1, ldraw_lib__stud(realsolid)],
// 0
];
module ldraw_lib__s__3004s01(step=0, col=false, unit=2/5, alt=false, line=0.2, solid=!$preview)
    makepoly(ldraw_lib__s__3004s01(solid), step=step, col=col, unit=unit, alt=alt, line=line, solid=solid);
ldraw_lib__s__3004s01(line=0.2);
// file: ../p/box5-12.scad
use <../lib.scad>
function ldraw_lib__box5_12() = [
// 0 Box with 5 Faces without Any Edges
// 0 Name: box5-12.dat
// 0 Author: Chris Dee [cwdee]
// 0 !LDRAW_ORG Primitive UPDATE 2009-02
// 0 !LICENSE Licensed under CC BY 2.0 and CC BY 4.0 : see CAreadme.txt
// 
// 0 BFC CERTIFY CCW
  [0,"BFC","CERTIFY"],
  [0,"BFC","CCW"],
// 
// 0 !HISTORY 2009-09-03 [PTadmin] Official Update 2009-02
// 
// 
// 4 16 1 1 1 1 1 -1 -1 1 -1 -1 1 1
  [4,16,1,1,1,1,1,-1,-1,1,-1,-1,1,1],
// 4 16 -1 0 1 1 0 1 1 1 1 -1 1 1
  [4,16,-1,0,1,1,0,1,1,1,1,-1,1,1],
// 4 16 -1 0 -1 -1 0 1 -1 1 1 -1 1 -1
  [4,16,-1,0,-1,-1,0,1,-1,1,1,-1,1,-1],
// 4 16 1 0 -1 -1 0 -1 -1 1 -1 1 1 -1
  [4,16,1,0,-1,-1,0,-1,-1,1,-1,1,1,-1],
// 4 16 1 0 1 1 0 -1 1 1 -1 1 1 1
  [4,16,1,0,1,1,0,-1,1,1,-1,1,1,1],
// 0
];
module ldraw_lib__box5_12(step=0, col=false, unit=2/5, alt=false, line=0.2, solid=!$preview)
    makepoly(ldraw_lib__box5_12(), step=step, col=col, unit=unit, alt=alt, line=line, solid=solid);
ldraw_lib__box5_12(line=0.2);
// file: 3004.scad
use <../lib.scad>
use <s/3004s01.scad>
function ldraw_lib__3004() = [
// 0 Brick  1 x  2
// 0 Name: 3004.dat
// 0 Author: James Jessiman
// 0 !LDRAW_ORG Part UPDATE 2022-05
// 0 !LICENSE Licensed under CC BY 2.0 and CC BY 4.0 : see CAreadme.txt
// 
// 0 BFC CERTIFY CCW
  [0,"BFC","CERTIFY"],
  [0,"BFC","CCW"],
// 
// 0 !HISTORY 2001-10-26 [PTadmin] Official Update 2001-01
// 0 !HISTORY 2002-05-07 {unknown} BFC Certification
// 0 !HISTORY 2002-06-11 [PTadmin] Official Update 2002-03
// 0 !HISTORY 2007-05-07 [PTadmin] Header formatted for Contributor Agreement
// 0 !HISTORY 2008-07-01 [PTadmin] Official Update 2008-01
// 0 !HISTORY 2022-08-04 [MagFors] Using subfile
// 0 !HISTORY 2022-09-15 [PTadmin] Official Update 2022-05
// 
// 
// 1 16 0 0 0 1 0 0 0 1 0 0 0 1 s\3004s01.dat
  [1,16,0,0,0,1,0,0,0,1,0,0,0,1, ldraw_lib__s__3004s01()],
// 4 16 -20 24 -10 20 24 -10 20 0 -10 -20 0 -10
  [4,16,-20,24,-10,20,24,-10,20,0,-10,-20,0,-10],
];
module ldraw_lib__3004(step=0, col=false, unit=2/5, alt=false, line=0.2, solid=!$preview)
    makepoly(ldraw_lib__3004(), step=step, col=col, unit=unit, alt=alt, line=line, solid=solid);
ldraw_lib__3004(line=0.2);
// file: 003672b.scad
use <../lib.scad>
use <../p/box5-12.scad>
use <s/003672bs01.scad>
$fa=1; $fs=0.2;
function ldraw_lib__003672b(realsolid=false) = [
// 0 Sticker  1 x  1 with White "TV2" on Blue Background
// 0 Name: 003672b.dat
// 0 Author: Willy Tschager [Holly-Wood]
// 0 !LDRAW_ORG Part UPDATE 2022-04
// 0 !LICENSE Licensed under CC BY 2.0 and CC BY 4.0 : see CAreadme.txt
// 
// 0 BFC CERTIFY CCW
  [0,"BFC","CERTIFY"],
  [0,"BFC","CCW"],
// 
// 0 !KEYWORDS Bricklink 664stk01, Brickowl 560716, camera, legoland
// 0 !KEYWORDS Rebrickable 3672, set 664, television, van
// 
// 0 !HISTORY 2022-07-18 [PTadmin] Official Update 2022-04
// 
// 
// 0 // Small Box
// 
// 1 16 0 -0.25 0 10 0 0 0 0.25 0 0 0 10 box5-12.dat
  [1,16,0,-0.25,0,10,0,0,0,0.25,0,0,0,10, ldraw_lib__box5_12(realsolid)],
// 
// 0 // www.holly-wood.it
// 
// 0 // Pattern Subpart
// 1 16 0 0 0 1 0 0 0 1 0 0 0 1 s\003672bs01.dat
  [1,16,0,0,0,1,0,0,0,1,0,0,0,1, ldraw_lib__s__003672bs01(realsolid)],
];
module ldraw_lib__003672b(step=0, col=false, unit=2/5, alt=false, line=0.2, solid=!$preview)
    makepoly(ldraw_lib__003672b(solid), step=step, col=col, unit=unit, alt=alt, line=line, solid=solid);
ldraw_lib__003672b(line=0.2);
// main file
use <../lib.scad>
use <003672b.scad>
use <3004.scad>
function ldraw_lib__3004d1a() = [
// 0 Brick  1 x  2 with White "TV2" on Blue Background Sticker on Both Ends
// 0 Name: 3004d1a.dat
// 0 Author: Vincent Messenet [Cheenzo]
// 0 !LDRAW_ORG Shortcut UPDATE 2025-05
// 0 !LICENSE Licensed under CC BY 4.0 : see CAreadme.txt
// 
// 0 BFC CERTIFY CCW
  [0,"BFC","CERTIFY"],
  [0,"BFC","CCW"],
// 
// 0 !CATEGORY Sticker Shortcut
// 0 !KEYWORDS Bricklink 3004pb073, Set 664-1
// 
// 0 !HISTORY 2025-05-28 [OrionP] Official Update 2025-05
// 
// 1 16 0 0 0 1 0 0 0 1 0 0 0 1 3004.dat
  [1,16,0,0,0,1,0,0,0,1,0,0,0,1, ldraw_lib__3004()],
// 1 16 20 12 0 0 -1 0 0 0 -1 1 0 0 003672b.dat
  [1,16,20,12,0,0,-1,0,0,0,-1,1,0,0, ldraw_lib__003672b()],
// 1 16 -20 12 0 0 1 0 0 0 -1 -1 0 0 003672b.dat
  [1,16,-20,12,0,0,1,0,0,0,-1,-1,0,0, ldraw_lib__003672b()],
];
module ldraw_lib__3004d1a(step=0, col=false, unit=2/5, alt=false, line=0.2, solid=!$preview)
    makepoly(ldraw_lib__3004d1a(), step=step, col=col, unit=unit, alt=alt, line=line, solid=solid);
ldraw_lib__3004d1a(line=0.2);
